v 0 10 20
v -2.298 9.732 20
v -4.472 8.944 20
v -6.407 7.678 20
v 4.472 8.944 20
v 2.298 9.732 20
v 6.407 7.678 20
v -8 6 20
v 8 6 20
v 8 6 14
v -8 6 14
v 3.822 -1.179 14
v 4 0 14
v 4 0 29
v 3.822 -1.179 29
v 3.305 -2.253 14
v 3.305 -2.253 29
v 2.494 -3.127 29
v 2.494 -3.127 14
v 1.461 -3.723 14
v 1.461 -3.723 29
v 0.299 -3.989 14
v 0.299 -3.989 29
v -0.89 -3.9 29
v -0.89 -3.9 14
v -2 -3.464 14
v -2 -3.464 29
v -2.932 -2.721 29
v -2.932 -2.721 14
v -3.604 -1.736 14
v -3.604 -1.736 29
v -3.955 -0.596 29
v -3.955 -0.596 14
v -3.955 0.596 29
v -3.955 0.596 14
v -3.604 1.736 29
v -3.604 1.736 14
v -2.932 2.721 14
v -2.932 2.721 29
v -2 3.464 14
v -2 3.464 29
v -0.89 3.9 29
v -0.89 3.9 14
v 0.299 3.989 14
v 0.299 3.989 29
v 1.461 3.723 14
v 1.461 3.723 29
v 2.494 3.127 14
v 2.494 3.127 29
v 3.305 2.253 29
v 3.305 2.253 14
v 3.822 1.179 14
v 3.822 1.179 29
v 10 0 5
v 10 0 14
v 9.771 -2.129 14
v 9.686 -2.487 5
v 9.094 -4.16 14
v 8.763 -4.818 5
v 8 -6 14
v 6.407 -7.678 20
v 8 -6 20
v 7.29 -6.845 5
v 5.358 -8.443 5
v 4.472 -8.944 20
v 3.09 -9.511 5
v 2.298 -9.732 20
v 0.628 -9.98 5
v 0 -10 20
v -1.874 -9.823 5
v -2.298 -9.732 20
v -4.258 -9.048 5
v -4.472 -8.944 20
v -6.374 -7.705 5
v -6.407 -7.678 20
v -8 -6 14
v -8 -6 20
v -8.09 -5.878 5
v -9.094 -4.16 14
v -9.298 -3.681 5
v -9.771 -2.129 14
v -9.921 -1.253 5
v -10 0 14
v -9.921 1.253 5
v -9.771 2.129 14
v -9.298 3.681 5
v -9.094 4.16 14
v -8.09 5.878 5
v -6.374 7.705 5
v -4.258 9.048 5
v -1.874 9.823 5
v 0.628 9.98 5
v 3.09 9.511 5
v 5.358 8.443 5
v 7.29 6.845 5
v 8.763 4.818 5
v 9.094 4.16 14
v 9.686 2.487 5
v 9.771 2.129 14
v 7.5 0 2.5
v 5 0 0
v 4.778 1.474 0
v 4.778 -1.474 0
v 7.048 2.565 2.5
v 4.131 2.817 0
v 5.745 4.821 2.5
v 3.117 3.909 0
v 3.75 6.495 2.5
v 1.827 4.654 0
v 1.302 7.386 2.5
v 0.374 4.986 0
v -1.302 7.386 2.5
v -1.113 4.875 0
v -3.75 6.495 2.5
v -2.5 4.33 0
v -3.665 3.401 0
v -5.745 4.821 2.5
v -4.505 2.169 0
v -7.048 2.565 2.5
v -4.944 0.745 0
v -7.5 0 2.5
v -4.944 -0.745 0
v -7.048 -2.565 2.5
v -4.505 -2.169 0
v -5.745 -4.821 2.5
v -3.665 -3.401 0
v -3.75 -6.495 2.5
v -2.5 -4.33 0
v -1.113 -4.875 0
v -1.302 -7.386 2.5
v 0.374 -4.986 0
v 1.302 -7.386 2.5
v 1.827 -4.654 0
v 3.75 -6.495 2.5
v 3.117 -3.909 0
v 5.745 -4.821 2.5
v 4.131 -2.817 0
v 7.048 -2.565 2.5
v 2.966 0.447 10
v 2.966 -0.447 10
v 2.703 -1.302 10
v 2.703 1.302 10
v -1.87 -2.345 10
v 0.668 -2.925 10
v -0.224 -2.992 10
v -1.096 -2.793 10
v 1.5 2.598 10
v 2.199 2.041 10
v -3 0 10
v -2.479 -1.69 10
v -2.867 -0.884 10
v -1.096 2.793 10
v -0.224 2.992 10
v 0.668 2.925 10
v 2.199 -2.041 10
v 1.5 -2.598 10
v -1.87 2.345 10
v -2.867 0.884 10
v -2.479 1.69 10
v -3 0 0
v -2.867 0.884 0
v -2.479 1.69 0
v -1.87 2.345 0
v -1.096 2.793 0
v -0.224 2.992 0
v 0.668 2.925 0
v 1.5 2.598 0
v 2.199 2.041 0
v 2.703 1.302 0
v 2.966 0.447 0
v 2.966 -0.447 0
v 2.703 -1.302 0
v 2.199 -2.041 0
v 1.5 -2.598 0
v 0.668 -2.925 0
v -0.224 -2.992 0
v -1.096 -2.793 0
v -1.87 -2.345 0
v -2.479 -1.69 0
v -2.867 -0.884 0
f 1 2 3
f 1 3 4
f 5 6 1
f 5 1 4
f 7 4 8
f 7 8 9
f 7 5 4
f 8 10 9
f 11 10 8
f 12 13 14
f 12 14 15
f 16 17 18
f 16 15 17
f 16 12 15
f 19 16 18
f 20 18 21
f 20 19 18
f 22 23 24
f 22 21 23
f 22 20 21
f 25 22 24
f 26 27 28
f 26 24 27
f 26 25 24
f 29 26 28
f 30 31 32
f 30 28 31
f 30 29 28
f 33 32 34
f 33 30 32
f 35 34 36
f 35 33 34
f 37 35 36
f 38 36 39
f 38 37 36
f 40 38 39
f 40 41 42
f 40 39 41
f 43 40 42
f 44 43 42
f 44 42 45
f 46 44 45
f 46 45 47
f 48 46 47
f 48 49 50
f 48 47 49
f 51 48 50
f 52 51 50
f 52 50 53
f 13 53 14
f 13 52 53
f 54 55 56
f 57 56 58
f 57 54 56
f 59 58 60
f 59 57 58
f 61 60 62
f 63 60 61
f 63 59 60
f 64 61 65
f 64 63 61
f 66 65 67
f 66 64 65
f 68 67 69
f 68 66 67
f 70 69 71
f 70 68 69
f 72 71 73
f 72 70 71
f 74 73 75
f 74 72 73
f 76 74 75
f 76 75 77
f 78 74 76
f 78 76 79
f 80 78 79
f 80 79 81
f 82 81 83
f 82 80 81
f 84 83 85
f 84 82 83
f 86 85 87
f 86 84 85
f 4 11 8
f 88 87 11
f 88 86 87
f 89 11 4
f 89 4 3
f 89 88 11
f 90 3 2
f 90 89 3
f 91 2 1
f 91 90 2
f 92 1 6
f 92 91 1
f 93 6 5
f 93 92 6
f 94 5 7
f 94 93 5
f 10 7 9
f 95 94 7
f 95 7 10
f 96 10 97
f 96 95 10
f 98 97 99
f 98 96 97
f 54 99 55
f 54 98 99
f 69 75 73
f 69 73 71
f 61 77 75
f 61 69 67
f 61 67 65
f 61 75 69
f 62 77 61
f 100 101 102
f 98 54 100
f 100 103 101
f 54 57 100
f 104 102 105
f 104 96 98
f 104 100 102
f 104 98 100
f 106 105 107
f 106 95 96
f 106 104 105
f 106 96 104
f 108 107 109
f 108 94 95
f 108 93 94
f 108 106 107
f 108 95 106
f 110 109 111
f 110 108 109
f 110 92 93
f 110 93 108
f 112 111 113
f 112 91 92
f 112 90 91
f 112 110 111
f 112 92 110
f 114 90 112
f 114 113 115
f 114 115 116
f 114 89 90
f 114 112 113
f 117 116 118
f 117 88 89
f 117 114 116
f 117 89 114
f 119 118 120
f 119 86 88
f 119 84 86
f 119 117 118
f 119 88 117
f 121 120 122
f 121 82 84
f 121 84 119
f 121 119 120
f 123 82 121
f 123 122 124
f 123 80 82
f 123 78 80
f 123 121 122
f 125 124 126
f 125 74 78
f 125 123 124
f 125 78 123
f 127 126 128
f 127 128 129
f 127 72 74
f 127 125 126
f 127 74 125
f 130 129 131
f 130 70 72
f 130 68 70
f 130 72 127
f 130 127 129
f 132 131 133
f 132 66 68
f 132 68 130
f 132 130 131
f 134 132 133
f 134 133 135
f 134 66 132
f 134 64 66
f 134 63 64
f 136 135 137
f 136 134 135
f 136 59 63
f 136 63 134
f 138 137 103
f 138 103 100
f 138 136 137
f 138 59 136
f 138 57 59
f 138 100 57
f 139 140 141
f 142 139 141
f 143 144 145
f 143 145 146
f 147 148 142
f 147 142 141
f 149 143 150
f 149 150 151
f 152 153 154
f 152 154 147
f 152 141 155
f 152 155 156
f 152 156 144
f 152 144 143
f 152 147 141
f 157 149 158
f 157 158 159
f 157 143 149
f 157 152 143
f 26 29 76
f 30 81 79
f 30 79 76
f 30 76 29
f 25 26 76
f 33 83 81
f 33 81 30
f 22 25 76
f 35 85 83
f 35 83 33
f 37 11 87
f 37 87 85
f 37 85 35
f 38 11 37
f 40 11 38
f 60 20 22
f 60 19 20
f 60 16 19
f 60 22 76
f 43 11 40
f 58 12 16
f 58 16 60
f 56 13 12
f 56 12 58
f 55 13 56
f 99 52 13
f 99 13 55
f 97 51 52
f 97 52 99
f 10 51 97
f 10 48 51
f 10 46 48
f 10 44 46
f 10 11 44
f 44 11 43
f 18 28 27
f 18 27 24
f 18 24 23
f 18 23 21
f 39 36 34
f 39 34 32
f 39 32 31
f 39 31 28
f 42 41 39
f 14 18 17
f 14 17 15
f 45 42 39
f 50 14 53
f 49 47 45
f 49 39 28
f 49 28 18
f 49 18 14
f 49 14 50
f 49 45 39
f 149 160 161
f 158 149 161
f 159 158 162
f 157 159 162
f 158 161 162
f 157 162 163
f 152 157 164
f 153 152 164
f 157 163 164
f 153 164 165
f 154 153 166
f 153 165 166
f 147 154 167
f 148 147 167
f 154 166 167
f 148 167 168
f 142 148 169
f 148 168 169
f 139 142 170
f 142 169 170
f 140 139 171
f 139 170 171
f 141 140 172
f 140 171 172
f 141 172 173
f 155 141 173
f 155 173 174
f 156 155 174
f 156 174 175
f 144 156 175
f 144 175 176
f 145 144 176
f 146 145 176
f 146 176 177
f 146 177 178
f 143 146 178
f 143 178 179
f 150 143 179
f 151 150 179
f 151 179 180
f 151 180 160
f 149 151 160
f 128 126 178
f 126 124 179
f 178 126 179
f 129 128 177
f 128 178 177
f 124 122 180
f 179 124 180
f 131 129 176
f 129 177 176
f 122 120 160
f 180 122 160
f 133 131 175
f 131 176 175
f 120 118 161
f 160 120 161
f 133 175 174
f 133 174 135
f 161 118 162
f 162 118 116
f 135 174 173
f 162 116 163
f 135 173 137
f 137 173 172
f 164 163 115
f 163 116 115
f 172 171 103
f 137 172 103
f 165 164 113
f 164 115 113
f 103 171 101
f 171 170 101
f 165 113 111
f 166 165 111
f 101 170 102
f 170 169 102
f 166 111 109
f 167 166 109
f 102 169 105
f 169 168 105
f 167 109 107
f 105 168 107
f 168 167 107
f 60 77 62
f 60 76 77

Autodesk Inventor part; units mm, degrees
ref_plane "YZ Plane" through (0, 0, 0) normal (1, 0, 0) x (0, 1, 0)
ref_plane "XZ Plane" through (0, 0, 0) normal (0, 1, 0) x (-1, 0, 0)
ref_plane "XY Plane" through (0, 0, 0) normal (0, 0, 1) x (1, 0, 0)
sketch "Sketch1" plane through (0, 0, 0) normal (0, 0, 1) x (1, 0, 0)
  circle A0 centre (0, 0) radius 10
  dimension "d0" = 20
extrude "Extrusion1" add sketch "Sketch1" along normal blind 18
sketch "Sketch2" plane through (0, 0, 18) normal (0, 0, 1) x (1, 0, 0)
  line L0 (0, 0) -> (0, 4) construction
  line L1 (0, 4) -> (-9.1652, 4)
  circle A0 centre (0, 0) radius 10 projected
  line L2 (0, 4) -> (9.1652, 4)
  line L3 (0, 0) -> (0, -4) construction
  line L4 (0, -4) -> (9.1652, -4)
  line L5 (0, -4) -> (-6.1702, -4)
  point P0 (-8, -6)
  dimension "d3" = 4
  dimension "d4" = 4
extrude "Extrusion2" cut sketch "Sketch2" against normal blind 4
sketch "Sketch3" plane through (0, 0, 0) normal (0, 0, -1) x (-1, 0, 0)
  circle A0 centre (0, 0) radius 3
  dimension "d7" = 6
extrude "Extrusion3" cut sketch "Sketch3" against normal blind 10
thread "Thread1" size "M6x1" class "6H" standard "ANSI Metric M Profile" full length
sketch "Sketch7" plane through (0, 0, 14) normal (0, 0, 1) x (1, 0, 0)
  line L0 (0, 0) -> (0, -6) construction
  line L1 (0, -6) -> (-8, -6)
  circle A0 centre (0, 0) radius 10 projected
  line L2 (0, -6) -> (8, -6)
  line L3 (8, 6) -> (-8, 6)
  dimension "d21" = 6
extrude "Extrusion5" add sketch "Sketch7" along normal blind 6 contours L2 A0 L1 | A0 L3
sketch "Sketch8" plane through (0, 0, 14) normal (0, 0, 1) x (1, 0, 0)
  circle A0 centre (0, 0) radius 4
  dimension "d24" = 8
extrude "Extrusion6" add sketch "Sketch8" along normal blind 15
thread "Thread4" size "M8x1.25" class "6g" standard "ANSI Metric M Profile" length 6
chamfer "Chamfer1" distance 5 angle 45 1 edges at (-10, 0, 0)
properties material "Aluminum 6061"
